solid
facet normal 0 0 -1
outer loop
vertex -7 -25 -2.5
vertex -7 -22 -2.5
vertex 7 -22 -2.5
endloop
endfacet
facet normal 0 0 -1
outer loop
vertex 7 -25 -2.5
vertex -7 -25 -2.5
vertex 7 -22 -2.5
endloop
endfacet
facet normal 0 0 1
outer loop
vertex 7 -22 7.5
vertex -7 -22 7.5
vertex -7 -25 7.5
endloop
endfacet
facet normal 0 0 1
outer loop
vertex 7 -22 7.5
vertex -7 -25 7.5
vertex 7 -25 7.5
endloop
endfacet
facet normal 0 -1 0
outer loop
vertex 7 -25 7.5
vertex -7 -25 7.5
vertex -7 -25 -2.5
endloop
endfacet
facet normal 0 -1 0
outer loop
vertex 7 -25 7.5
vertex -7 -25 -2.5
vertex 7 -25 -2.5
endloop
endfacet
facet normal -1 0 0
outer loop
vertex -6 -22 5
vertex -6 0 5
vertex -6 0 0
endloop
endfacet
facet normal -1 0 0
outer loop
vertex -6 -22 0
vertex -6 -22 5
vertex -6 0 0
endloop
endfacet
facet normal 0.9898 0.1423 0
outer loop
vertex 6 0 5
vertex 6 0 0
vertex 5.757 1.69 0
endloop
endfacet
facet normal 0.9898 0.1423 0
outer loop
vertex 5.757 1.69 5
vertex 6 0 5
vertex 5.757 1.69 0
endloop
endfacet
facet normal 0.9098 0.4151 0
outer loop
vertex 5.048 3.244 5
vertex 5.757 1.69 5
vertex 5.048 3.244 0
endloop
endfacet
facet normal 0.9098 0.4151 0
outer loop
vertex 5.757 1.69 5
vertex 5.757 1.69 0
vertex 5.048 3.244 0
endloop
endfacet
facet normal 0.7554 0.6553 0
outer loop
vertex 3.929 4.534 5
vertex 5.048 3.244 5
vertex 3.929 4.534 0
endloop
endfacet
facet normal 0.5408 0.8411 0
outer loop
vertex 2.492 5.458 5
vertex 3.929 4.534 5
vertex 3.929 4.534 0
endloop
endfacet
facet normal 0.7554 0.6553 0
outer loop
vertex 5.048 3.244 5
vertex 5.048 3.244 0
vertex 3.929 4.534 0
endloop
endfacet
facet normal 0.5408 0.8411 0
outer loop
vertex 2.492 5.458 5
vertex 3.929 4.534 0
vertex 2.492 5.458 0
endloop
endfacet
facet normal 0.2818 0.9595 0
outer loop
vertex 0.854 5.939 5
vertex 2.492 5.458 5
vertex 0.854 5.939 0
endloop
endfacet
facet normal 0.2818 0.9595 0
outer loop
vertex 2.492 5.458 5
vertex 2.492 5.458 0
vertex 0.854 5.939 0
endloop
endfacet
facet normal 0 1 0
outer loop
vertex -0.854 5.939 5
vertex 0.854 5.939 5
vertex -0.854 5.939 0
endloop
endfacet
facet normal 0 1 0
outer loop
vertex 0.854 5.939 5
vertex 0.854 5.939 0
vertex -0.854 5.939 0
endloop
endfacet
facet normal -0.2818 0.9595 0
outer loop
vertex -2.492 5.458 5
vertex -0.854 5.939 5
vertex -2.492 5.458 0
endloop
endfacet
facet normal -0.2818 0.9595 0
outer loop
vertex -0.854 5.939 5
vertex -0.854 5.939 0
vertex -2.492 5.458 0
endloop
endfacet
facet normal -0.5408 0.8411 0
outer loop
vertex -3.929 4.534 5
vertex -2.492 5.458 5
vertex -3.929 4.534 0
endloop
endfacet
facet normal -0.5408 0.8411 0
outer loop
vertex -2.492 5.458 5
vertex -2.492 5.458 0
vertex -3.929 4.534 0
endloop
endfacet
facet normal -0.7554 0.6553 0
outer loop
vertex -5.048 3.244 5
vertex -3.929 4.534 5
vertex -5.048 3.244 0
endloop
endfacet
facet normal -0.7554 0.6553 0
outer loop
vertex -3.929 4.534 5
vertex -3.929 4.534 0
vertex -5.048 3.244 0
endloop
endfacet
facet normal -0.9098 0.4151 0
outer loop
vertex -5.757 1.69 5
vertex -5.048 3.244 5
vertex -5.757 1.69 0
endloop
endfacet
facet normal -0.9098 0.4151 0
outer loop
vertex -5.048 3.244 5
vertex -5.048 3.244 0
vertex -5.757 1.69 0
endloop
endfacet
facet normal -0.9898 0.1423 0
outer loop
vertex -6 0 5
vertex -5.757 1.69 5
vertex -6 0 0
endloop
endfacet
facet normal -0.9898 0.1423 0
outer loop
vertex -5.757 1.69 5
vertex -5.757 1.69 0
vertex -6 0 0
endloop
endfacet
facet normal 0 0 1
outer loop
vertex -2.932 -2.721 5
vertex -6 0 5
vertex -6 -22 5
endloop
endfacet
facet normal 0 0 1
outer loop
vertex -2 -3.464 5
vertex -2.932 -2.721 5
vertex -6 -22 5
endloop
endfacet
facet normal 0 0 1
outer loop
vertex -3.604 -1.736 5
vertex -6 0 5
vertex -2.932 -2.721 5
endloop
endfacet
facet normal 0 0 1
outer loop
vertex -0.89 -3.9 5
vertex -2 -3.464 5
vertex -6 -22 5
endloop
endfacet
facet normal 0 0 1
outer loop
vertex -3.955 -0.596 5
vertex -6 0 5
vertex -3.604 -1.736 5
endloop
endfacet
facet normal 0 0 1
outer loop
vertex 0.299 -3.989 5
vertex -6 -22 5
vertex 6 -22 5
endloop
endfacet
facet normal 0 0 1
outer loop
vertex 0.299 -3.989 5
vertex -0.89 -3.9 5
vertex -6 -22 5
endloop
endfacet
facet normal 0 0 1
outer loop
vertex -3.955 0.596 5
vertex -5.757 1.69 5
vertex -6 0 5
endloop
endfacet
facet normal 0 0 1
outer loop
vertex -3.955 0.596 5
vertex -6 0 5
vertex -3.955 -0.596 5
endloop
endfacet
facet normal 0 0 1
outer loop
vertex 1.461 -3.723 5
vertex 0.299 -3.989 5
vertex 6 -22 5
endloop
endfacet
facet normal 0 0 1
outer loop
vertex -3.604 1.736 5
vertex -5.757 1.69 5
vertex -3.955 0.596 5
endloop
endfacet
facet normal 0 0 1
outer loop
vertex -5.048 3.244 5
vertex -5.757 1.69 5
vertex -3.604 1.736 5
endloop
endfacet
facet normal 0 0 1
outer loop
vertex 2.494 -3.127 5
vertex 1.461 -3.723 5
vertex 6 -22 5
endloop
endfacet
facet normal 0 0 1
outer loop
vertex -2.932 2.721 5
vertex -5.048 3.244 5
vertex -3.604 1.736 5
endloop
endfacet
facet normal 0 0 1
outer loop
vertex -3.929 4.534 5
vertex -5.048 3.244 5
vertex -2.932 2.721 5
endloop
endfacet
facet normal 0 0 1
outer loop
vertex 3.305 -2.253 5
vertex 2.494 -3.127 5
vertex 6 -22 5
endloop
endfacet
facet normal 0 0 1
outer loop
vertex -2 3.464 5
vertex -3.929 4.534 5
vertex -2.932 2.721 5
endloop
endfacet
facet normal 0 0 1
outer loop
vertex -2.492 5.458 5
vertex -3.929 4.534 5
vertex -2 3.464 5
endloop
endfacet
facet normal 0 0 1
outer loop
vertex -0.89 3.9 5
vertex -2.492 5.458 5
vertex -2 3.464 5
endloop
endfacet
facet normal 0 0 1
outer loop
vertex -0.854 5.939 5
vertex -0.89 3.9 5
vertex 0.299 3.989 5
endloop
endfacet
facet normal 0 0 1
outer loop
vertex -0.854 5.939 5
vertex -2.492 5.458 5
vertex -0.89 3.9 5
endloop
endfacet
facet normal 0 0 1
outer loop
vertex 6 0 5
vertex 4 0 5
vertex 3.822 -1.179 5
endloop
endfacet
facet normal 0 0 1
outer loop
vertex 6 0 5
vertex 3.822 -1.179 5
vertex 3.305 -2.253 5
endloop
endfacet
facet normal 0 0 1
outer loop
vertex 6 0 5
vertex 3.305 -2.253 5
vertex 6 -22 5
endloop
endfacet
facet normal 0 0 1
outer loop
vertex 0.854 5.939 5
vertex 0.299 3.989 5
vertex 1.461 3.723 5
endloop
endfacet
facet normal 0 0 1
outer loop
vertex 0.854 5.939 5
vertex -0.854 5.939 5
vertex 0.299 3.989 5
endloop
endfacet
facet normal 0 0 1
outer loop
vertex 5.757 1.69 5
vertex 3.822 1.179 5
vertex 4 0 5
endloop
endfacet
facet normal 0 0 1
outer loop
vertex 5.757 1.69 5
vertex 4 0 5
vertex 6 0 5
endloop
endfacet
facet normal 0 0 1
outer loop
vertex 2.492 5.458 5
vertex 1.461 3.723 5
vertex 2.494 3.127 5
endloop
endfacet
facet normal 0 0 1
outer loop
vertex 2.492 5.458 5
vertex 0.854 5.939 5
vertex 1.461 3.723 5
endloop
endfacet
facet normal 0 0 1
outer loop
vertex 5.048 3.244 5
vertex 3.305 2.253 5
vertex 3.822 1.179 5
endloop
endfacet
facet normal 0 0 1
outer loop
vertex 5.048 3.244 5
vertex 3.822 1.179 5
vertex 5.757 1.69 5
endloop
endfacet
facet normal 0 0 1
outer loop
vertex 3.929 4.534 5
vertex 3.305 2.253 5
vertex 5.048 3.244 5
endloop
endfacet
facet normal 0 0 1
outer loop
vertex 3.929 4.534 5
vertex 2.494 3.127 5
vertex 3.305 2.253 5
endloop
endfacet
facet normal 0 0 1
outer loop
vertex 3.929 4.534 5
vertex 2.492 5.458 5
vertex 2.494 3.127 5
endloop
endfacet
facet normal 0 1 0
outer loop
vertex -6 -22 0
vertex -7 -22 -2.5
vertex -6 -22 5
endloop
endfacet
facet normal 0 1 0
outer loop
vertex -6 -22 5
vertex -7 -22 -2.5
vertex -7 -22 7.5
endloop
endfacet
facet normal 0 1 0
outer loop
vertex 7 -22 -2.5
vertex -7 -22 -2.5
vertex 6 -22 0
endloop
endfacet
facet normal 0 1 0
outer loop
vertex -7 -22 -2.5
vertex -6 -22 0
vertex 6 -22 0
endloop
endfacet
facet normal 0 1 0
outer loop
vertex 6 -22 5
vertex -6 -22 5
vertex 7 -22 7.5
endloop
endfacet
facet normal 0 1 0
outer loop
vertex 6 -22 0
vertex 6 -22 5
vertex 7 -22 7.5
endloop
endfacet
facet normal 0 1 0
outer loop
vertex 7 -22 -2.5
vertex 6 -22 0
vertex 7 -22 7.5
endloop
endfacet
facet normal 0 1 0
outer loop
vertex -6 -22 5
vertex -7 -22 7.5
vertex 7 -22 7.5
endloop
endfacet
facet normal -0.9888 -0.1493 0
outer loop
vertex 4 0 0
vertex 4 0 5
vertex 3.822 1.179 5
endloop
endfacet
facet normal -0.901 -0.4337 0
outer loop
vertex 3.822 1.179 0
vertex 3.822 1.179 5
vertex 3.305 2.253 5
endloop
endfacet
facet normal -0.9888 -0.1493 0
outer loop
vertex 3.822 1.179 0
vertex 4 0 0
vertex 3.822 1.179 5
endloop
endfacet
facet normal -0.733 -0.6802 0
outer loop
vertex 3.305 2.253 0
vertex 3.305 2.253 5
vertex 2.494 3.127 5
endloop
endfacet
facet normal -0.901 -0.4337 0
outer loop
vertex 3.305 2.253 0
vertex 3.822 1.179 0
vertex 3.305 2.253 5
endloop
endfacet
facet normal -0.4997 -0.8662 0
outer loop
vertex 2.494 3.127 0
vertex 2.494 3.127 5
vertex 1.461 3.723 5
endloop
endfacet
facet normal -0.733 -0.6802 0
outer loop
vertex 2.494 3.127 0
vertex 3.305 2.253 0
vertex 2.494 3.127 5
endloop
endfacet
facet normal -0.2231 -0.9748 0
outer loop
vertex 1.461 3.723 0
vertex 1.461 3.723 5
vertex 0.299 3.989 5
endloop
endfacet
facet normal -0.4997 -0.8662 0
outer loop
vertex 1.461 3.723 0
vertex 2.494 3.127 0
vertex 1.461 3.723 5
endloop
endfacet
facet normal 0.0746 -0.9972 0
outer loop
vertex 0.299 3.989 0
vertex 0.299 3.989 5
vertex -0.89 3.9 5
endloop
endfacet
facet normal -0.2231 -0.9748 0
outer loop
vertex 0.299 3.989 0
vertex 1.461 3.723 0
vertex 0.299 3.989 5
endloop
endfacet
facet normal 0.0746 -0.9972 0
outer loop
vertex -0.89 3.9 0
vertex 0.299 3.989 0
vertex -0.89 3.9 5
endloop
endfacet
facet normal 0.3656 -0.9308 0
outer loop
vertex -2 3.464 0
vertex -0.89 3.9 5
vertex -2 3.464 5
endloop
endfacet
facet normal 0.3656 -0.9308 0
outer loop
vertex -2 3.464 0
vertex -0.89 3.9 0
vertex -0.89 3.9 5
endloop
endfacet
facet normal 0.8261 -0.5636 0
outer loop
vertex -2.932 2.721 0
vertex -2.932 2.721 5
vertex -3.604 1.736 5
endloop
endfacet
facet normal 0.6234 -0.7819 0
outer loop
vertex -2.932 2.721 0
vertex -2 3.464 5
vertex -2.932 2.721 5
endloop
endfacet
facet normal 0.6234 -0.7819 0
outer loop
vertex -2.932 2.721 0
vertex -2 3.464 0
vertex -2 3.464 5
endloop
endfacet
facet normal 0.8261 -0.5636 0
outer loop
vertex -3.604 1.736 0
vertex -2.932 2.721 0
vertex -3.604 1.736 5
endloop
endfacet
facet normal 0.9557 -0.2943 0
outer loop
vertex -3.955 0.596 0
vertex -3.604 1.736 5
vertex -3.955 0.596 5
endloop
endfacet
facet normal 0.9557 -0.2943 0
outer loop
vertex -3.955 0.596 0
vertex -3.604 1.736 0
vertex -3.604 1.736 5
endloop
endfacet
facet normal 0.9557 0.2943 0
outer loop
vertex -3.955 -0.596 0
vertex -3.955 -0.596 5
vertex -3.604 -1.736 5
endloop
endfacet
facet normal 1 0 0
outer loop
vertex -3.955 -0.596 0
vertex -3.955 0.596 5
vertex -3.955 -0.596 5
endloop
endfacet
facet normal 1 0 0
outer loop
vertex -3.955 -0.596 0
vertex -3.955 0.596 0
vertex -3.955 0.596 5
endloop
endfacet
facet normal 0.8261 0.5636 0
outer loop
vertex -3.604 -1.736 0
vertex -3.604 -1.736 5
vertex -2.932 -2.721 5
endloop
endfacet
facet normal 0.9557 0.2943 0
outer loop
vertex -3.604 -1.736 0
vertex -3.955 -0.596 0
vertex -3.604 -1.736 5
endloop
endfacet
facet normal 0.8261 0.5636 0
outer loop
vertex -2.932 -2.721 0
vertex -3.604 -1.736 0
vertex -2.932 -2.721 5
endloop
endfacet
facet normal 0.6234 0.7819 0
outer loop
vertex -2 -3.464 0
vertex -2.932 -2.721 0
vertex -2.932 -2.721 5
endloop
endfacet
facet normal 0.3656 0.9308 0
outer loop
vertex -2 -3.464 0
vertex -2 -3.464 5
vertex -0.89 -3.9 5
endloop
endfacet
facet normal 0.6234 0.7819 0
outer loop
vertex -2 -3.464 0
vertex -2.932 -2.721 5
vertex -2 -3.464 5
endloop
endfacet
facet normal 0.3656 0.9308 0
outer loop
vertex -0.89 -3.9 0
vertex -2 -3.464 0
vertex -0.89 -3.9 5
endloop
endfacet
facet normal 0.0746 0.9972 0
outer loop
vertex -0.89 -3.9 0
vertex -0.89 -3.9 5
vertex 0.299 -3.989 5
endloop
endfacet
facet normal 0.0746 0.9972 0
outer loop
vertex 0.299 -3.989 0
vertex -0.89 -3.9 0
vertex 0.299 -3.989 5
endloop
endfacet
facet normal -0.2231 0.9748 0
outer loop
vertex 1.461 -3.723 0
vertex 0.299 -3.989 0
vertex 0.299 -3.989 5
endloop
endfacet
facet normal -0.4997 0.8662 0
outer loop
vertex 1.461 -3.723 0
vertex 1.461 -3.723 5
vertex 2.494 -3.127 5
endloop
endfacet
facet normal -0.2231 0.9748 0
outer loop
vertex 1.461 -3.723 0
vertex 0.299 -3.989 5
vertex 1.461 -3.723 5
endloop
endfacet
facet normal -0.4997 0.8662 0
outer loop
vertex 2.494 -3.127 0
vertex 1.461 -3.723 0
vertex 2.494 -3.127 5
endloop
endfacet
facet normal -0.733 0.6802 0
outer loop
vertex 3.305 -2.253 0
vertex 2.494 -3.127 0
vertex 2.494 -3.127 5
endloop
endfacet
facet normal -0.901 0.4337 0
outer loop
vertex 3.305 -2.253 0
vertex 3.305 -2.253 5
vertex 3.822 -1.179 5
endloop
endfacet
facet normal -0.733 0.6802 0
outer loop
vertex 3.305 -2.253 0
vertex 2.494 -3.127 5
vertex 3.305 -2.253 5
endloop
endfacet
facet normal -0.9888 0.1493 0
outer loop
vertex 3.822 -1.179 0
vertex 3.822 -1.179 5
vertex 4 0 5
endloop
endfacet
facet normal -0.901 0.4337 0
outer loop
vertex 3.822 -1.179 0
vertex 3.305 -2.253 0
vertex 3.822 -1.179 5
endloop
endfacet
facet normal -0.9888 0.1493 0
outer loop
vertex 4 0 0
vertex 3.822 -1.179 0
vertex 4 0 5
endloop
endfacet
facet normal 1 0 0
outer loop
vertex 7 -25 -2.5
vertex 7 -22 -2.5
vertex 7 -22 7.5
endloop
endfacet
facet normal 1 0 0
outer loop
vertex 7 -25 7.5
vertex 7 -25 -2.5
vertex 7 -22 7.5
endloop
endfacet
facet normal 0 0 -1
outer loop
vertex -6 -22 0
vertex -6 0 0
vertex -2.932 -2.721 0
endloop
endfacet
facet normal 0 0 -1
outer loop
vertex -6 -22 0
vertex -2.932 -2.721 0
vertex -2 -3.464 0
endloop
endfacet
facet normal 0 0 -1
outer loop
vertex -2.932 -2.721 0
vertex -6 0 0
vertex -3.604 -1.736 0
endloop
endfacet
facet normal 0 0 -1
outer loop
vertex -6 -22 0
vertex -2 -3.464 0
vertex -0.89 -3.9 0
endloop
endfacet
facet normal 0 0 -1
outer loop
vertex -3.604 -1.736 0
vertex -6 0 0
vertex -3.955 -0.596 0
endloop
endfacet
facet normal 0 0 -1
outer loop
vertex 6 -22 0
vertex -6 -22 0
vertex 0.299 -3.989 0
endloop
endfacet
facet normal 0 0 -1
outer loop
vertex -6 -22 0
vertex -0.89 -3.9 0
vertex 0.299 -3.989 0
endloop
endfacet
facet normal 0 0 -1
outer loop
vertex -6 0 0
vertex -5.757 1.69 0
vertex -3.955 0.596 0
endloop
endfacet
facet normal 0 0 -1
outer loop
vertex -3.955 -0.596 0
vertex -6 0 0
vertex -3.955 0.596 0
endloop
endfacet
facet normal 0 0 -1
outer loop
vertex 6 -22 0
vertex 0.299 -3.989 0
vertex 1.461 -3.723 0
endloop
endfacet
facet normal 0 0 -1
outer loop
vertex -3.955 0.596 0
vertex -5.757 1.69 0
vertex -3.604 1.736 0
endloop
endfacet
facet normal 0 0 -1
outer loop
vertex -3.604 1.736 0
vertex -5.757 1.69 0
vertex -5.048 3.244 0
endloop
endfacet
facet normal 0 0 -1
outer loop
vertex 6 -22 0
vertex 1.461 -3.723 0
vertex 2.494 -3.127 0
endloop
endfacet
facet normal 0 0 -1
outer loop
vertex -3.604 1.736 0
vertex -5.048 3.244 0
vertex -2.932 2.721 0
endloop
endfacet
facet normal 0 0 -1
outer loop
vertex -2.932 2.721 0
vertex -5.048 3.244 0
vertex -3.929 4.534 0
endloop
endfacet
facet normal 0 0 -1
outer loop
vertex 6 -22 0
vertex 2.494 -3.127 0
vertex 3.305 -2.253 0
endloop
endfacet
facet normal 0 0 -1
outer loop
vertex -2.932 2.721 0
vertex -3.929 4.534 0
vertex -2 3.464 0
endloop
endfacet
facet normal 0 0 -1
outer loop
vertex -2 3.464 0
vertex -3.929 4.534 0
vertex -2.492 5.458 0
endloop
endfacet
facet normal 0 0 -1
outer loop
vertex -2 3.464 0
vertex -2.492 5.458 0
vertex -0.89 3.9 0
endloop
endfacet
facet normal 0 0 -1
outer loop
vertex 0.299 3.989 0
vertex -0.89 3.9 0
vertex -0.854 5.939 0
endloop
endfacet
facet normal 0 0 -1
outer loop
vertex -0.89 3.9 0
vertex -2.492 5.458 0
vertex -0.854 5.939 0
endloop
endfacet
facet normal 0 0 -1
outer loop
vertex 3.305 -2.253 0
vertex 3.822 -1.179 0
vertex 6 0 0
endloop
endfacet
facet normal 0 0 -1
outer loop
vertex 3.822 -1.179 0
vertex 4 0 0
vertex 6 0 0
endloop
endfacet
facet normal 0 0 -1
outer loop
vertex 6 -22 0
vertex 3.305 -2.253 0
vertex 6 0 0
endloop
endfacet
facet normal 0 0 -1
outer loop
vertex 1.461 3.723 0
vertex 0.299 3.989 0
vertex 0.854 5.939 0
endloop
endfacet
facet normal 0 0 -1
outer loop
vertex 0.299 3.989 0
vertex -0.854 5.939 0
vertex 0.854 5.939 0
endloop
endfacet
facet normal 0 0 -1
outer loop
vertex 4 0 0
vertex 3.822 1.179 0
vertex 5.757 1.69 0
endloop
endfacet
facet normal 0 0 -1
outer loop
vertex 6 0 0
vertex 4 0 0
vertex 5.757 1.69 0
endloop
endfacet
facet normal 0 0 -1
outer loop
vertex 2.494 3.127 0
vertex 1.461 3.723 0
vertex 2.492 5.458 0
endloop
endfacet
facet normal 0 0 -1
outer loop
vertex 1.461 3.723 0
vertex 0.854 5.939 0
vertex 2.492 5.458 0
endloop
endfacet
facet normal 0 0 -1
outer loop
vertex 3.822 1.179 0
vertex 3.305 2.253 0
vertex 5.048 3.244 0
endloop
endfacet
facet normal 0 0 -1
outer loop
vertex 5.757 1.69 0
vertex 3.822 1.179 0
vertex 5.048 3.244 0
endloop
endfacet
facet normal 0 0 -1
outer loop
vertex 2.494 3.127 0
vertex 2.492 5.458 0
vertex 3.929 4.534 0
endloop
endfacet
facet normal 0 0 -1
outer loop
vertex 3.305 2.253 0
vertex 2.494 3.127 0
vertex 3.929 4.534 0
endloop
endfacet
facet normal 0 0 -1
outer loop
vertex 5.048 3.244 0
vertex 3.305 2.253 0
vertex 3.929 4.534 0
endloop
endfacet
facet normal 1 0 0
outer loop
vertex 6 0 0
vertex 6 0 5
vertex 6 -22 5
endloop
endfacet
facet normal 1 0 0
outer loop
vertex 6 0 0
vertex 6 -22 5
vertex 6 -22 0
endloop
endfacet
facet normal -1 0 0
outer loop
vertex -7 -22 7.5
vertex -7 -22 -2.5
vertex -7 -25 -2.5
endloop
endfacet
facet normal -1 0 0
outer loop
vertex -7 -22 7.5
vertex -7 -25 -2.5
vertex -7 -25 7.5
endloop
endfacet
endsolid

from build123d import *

# Parameters (mm, degrees)
SKETCH1_R               = 6
SKETCH1_R_2             = 4
BOSS_EXTRUDE1_DEPTH     = 5
SKETCH2_W               = 12
SKETCH2_H               = 5
BOSS_EXTRUDE2_DEPTH     = 22
CUT_EXTRUDE1_DEPTH      = 24.34523506
CUT_EXTRUDE1_DEPTH_BACK = 24.34523506
SKETCH5_R               = 4
SKETCH6_W               = 14
SKETCH6_H               = 10
BOSS_EXTRUDE3_DEPTH     = 3


with BuildPart() as part:
    # Sketch1 → Boss-Extrude1 (new body)
    with BuildSketch(Plane.XY):
        Circle(SKETCH1_R)
        Circle(SKETCH1_R_2, mode=Mode.SUBTRACT)
    extrude(amount=BOSS_EXTRUDE1_DEPTH)

    # Sketch2 → Boss-Extrude2 (add)
    with BuildSketch(Plane(origin=(0, 0, 0), x_dir=(1, 0, 0), z_dir=(0, 1, 0))):
        with Locations((0, -2.5)):
            Rectangle(SKETCH2_W, SKETCH2_H)
    extrude(amount=-BOSS_EXTRUDE2_DEPTH)

    # Sketch5 → Cut-Extrude1 (cut, two sides: drawn at the far end of the back side and taken through both)
    with BuildSketch(Plane.XY.offset(5).offset(-CUT_EXTRUDE1_DEPTH_BACK)):
        Circle(SKETCH5_R)
    extrude(amount=CUT_EXTRUDE1_DEPTH + CUT_EXTRUDE1_DEPTH_BACK, mode=Mode.SUBTRACT)

    # Sketch6 → Boss-Extrude3 (add)
    with BuildSketch(Plane.XZ.offset(22)):
        with Locations((0, 2.5)):
            Rectangle(SKETCH6_W, SKETCH6_H)
    extrude(amount=BOSS_EXTRUDE3_DEPTH)


solid = part.part
